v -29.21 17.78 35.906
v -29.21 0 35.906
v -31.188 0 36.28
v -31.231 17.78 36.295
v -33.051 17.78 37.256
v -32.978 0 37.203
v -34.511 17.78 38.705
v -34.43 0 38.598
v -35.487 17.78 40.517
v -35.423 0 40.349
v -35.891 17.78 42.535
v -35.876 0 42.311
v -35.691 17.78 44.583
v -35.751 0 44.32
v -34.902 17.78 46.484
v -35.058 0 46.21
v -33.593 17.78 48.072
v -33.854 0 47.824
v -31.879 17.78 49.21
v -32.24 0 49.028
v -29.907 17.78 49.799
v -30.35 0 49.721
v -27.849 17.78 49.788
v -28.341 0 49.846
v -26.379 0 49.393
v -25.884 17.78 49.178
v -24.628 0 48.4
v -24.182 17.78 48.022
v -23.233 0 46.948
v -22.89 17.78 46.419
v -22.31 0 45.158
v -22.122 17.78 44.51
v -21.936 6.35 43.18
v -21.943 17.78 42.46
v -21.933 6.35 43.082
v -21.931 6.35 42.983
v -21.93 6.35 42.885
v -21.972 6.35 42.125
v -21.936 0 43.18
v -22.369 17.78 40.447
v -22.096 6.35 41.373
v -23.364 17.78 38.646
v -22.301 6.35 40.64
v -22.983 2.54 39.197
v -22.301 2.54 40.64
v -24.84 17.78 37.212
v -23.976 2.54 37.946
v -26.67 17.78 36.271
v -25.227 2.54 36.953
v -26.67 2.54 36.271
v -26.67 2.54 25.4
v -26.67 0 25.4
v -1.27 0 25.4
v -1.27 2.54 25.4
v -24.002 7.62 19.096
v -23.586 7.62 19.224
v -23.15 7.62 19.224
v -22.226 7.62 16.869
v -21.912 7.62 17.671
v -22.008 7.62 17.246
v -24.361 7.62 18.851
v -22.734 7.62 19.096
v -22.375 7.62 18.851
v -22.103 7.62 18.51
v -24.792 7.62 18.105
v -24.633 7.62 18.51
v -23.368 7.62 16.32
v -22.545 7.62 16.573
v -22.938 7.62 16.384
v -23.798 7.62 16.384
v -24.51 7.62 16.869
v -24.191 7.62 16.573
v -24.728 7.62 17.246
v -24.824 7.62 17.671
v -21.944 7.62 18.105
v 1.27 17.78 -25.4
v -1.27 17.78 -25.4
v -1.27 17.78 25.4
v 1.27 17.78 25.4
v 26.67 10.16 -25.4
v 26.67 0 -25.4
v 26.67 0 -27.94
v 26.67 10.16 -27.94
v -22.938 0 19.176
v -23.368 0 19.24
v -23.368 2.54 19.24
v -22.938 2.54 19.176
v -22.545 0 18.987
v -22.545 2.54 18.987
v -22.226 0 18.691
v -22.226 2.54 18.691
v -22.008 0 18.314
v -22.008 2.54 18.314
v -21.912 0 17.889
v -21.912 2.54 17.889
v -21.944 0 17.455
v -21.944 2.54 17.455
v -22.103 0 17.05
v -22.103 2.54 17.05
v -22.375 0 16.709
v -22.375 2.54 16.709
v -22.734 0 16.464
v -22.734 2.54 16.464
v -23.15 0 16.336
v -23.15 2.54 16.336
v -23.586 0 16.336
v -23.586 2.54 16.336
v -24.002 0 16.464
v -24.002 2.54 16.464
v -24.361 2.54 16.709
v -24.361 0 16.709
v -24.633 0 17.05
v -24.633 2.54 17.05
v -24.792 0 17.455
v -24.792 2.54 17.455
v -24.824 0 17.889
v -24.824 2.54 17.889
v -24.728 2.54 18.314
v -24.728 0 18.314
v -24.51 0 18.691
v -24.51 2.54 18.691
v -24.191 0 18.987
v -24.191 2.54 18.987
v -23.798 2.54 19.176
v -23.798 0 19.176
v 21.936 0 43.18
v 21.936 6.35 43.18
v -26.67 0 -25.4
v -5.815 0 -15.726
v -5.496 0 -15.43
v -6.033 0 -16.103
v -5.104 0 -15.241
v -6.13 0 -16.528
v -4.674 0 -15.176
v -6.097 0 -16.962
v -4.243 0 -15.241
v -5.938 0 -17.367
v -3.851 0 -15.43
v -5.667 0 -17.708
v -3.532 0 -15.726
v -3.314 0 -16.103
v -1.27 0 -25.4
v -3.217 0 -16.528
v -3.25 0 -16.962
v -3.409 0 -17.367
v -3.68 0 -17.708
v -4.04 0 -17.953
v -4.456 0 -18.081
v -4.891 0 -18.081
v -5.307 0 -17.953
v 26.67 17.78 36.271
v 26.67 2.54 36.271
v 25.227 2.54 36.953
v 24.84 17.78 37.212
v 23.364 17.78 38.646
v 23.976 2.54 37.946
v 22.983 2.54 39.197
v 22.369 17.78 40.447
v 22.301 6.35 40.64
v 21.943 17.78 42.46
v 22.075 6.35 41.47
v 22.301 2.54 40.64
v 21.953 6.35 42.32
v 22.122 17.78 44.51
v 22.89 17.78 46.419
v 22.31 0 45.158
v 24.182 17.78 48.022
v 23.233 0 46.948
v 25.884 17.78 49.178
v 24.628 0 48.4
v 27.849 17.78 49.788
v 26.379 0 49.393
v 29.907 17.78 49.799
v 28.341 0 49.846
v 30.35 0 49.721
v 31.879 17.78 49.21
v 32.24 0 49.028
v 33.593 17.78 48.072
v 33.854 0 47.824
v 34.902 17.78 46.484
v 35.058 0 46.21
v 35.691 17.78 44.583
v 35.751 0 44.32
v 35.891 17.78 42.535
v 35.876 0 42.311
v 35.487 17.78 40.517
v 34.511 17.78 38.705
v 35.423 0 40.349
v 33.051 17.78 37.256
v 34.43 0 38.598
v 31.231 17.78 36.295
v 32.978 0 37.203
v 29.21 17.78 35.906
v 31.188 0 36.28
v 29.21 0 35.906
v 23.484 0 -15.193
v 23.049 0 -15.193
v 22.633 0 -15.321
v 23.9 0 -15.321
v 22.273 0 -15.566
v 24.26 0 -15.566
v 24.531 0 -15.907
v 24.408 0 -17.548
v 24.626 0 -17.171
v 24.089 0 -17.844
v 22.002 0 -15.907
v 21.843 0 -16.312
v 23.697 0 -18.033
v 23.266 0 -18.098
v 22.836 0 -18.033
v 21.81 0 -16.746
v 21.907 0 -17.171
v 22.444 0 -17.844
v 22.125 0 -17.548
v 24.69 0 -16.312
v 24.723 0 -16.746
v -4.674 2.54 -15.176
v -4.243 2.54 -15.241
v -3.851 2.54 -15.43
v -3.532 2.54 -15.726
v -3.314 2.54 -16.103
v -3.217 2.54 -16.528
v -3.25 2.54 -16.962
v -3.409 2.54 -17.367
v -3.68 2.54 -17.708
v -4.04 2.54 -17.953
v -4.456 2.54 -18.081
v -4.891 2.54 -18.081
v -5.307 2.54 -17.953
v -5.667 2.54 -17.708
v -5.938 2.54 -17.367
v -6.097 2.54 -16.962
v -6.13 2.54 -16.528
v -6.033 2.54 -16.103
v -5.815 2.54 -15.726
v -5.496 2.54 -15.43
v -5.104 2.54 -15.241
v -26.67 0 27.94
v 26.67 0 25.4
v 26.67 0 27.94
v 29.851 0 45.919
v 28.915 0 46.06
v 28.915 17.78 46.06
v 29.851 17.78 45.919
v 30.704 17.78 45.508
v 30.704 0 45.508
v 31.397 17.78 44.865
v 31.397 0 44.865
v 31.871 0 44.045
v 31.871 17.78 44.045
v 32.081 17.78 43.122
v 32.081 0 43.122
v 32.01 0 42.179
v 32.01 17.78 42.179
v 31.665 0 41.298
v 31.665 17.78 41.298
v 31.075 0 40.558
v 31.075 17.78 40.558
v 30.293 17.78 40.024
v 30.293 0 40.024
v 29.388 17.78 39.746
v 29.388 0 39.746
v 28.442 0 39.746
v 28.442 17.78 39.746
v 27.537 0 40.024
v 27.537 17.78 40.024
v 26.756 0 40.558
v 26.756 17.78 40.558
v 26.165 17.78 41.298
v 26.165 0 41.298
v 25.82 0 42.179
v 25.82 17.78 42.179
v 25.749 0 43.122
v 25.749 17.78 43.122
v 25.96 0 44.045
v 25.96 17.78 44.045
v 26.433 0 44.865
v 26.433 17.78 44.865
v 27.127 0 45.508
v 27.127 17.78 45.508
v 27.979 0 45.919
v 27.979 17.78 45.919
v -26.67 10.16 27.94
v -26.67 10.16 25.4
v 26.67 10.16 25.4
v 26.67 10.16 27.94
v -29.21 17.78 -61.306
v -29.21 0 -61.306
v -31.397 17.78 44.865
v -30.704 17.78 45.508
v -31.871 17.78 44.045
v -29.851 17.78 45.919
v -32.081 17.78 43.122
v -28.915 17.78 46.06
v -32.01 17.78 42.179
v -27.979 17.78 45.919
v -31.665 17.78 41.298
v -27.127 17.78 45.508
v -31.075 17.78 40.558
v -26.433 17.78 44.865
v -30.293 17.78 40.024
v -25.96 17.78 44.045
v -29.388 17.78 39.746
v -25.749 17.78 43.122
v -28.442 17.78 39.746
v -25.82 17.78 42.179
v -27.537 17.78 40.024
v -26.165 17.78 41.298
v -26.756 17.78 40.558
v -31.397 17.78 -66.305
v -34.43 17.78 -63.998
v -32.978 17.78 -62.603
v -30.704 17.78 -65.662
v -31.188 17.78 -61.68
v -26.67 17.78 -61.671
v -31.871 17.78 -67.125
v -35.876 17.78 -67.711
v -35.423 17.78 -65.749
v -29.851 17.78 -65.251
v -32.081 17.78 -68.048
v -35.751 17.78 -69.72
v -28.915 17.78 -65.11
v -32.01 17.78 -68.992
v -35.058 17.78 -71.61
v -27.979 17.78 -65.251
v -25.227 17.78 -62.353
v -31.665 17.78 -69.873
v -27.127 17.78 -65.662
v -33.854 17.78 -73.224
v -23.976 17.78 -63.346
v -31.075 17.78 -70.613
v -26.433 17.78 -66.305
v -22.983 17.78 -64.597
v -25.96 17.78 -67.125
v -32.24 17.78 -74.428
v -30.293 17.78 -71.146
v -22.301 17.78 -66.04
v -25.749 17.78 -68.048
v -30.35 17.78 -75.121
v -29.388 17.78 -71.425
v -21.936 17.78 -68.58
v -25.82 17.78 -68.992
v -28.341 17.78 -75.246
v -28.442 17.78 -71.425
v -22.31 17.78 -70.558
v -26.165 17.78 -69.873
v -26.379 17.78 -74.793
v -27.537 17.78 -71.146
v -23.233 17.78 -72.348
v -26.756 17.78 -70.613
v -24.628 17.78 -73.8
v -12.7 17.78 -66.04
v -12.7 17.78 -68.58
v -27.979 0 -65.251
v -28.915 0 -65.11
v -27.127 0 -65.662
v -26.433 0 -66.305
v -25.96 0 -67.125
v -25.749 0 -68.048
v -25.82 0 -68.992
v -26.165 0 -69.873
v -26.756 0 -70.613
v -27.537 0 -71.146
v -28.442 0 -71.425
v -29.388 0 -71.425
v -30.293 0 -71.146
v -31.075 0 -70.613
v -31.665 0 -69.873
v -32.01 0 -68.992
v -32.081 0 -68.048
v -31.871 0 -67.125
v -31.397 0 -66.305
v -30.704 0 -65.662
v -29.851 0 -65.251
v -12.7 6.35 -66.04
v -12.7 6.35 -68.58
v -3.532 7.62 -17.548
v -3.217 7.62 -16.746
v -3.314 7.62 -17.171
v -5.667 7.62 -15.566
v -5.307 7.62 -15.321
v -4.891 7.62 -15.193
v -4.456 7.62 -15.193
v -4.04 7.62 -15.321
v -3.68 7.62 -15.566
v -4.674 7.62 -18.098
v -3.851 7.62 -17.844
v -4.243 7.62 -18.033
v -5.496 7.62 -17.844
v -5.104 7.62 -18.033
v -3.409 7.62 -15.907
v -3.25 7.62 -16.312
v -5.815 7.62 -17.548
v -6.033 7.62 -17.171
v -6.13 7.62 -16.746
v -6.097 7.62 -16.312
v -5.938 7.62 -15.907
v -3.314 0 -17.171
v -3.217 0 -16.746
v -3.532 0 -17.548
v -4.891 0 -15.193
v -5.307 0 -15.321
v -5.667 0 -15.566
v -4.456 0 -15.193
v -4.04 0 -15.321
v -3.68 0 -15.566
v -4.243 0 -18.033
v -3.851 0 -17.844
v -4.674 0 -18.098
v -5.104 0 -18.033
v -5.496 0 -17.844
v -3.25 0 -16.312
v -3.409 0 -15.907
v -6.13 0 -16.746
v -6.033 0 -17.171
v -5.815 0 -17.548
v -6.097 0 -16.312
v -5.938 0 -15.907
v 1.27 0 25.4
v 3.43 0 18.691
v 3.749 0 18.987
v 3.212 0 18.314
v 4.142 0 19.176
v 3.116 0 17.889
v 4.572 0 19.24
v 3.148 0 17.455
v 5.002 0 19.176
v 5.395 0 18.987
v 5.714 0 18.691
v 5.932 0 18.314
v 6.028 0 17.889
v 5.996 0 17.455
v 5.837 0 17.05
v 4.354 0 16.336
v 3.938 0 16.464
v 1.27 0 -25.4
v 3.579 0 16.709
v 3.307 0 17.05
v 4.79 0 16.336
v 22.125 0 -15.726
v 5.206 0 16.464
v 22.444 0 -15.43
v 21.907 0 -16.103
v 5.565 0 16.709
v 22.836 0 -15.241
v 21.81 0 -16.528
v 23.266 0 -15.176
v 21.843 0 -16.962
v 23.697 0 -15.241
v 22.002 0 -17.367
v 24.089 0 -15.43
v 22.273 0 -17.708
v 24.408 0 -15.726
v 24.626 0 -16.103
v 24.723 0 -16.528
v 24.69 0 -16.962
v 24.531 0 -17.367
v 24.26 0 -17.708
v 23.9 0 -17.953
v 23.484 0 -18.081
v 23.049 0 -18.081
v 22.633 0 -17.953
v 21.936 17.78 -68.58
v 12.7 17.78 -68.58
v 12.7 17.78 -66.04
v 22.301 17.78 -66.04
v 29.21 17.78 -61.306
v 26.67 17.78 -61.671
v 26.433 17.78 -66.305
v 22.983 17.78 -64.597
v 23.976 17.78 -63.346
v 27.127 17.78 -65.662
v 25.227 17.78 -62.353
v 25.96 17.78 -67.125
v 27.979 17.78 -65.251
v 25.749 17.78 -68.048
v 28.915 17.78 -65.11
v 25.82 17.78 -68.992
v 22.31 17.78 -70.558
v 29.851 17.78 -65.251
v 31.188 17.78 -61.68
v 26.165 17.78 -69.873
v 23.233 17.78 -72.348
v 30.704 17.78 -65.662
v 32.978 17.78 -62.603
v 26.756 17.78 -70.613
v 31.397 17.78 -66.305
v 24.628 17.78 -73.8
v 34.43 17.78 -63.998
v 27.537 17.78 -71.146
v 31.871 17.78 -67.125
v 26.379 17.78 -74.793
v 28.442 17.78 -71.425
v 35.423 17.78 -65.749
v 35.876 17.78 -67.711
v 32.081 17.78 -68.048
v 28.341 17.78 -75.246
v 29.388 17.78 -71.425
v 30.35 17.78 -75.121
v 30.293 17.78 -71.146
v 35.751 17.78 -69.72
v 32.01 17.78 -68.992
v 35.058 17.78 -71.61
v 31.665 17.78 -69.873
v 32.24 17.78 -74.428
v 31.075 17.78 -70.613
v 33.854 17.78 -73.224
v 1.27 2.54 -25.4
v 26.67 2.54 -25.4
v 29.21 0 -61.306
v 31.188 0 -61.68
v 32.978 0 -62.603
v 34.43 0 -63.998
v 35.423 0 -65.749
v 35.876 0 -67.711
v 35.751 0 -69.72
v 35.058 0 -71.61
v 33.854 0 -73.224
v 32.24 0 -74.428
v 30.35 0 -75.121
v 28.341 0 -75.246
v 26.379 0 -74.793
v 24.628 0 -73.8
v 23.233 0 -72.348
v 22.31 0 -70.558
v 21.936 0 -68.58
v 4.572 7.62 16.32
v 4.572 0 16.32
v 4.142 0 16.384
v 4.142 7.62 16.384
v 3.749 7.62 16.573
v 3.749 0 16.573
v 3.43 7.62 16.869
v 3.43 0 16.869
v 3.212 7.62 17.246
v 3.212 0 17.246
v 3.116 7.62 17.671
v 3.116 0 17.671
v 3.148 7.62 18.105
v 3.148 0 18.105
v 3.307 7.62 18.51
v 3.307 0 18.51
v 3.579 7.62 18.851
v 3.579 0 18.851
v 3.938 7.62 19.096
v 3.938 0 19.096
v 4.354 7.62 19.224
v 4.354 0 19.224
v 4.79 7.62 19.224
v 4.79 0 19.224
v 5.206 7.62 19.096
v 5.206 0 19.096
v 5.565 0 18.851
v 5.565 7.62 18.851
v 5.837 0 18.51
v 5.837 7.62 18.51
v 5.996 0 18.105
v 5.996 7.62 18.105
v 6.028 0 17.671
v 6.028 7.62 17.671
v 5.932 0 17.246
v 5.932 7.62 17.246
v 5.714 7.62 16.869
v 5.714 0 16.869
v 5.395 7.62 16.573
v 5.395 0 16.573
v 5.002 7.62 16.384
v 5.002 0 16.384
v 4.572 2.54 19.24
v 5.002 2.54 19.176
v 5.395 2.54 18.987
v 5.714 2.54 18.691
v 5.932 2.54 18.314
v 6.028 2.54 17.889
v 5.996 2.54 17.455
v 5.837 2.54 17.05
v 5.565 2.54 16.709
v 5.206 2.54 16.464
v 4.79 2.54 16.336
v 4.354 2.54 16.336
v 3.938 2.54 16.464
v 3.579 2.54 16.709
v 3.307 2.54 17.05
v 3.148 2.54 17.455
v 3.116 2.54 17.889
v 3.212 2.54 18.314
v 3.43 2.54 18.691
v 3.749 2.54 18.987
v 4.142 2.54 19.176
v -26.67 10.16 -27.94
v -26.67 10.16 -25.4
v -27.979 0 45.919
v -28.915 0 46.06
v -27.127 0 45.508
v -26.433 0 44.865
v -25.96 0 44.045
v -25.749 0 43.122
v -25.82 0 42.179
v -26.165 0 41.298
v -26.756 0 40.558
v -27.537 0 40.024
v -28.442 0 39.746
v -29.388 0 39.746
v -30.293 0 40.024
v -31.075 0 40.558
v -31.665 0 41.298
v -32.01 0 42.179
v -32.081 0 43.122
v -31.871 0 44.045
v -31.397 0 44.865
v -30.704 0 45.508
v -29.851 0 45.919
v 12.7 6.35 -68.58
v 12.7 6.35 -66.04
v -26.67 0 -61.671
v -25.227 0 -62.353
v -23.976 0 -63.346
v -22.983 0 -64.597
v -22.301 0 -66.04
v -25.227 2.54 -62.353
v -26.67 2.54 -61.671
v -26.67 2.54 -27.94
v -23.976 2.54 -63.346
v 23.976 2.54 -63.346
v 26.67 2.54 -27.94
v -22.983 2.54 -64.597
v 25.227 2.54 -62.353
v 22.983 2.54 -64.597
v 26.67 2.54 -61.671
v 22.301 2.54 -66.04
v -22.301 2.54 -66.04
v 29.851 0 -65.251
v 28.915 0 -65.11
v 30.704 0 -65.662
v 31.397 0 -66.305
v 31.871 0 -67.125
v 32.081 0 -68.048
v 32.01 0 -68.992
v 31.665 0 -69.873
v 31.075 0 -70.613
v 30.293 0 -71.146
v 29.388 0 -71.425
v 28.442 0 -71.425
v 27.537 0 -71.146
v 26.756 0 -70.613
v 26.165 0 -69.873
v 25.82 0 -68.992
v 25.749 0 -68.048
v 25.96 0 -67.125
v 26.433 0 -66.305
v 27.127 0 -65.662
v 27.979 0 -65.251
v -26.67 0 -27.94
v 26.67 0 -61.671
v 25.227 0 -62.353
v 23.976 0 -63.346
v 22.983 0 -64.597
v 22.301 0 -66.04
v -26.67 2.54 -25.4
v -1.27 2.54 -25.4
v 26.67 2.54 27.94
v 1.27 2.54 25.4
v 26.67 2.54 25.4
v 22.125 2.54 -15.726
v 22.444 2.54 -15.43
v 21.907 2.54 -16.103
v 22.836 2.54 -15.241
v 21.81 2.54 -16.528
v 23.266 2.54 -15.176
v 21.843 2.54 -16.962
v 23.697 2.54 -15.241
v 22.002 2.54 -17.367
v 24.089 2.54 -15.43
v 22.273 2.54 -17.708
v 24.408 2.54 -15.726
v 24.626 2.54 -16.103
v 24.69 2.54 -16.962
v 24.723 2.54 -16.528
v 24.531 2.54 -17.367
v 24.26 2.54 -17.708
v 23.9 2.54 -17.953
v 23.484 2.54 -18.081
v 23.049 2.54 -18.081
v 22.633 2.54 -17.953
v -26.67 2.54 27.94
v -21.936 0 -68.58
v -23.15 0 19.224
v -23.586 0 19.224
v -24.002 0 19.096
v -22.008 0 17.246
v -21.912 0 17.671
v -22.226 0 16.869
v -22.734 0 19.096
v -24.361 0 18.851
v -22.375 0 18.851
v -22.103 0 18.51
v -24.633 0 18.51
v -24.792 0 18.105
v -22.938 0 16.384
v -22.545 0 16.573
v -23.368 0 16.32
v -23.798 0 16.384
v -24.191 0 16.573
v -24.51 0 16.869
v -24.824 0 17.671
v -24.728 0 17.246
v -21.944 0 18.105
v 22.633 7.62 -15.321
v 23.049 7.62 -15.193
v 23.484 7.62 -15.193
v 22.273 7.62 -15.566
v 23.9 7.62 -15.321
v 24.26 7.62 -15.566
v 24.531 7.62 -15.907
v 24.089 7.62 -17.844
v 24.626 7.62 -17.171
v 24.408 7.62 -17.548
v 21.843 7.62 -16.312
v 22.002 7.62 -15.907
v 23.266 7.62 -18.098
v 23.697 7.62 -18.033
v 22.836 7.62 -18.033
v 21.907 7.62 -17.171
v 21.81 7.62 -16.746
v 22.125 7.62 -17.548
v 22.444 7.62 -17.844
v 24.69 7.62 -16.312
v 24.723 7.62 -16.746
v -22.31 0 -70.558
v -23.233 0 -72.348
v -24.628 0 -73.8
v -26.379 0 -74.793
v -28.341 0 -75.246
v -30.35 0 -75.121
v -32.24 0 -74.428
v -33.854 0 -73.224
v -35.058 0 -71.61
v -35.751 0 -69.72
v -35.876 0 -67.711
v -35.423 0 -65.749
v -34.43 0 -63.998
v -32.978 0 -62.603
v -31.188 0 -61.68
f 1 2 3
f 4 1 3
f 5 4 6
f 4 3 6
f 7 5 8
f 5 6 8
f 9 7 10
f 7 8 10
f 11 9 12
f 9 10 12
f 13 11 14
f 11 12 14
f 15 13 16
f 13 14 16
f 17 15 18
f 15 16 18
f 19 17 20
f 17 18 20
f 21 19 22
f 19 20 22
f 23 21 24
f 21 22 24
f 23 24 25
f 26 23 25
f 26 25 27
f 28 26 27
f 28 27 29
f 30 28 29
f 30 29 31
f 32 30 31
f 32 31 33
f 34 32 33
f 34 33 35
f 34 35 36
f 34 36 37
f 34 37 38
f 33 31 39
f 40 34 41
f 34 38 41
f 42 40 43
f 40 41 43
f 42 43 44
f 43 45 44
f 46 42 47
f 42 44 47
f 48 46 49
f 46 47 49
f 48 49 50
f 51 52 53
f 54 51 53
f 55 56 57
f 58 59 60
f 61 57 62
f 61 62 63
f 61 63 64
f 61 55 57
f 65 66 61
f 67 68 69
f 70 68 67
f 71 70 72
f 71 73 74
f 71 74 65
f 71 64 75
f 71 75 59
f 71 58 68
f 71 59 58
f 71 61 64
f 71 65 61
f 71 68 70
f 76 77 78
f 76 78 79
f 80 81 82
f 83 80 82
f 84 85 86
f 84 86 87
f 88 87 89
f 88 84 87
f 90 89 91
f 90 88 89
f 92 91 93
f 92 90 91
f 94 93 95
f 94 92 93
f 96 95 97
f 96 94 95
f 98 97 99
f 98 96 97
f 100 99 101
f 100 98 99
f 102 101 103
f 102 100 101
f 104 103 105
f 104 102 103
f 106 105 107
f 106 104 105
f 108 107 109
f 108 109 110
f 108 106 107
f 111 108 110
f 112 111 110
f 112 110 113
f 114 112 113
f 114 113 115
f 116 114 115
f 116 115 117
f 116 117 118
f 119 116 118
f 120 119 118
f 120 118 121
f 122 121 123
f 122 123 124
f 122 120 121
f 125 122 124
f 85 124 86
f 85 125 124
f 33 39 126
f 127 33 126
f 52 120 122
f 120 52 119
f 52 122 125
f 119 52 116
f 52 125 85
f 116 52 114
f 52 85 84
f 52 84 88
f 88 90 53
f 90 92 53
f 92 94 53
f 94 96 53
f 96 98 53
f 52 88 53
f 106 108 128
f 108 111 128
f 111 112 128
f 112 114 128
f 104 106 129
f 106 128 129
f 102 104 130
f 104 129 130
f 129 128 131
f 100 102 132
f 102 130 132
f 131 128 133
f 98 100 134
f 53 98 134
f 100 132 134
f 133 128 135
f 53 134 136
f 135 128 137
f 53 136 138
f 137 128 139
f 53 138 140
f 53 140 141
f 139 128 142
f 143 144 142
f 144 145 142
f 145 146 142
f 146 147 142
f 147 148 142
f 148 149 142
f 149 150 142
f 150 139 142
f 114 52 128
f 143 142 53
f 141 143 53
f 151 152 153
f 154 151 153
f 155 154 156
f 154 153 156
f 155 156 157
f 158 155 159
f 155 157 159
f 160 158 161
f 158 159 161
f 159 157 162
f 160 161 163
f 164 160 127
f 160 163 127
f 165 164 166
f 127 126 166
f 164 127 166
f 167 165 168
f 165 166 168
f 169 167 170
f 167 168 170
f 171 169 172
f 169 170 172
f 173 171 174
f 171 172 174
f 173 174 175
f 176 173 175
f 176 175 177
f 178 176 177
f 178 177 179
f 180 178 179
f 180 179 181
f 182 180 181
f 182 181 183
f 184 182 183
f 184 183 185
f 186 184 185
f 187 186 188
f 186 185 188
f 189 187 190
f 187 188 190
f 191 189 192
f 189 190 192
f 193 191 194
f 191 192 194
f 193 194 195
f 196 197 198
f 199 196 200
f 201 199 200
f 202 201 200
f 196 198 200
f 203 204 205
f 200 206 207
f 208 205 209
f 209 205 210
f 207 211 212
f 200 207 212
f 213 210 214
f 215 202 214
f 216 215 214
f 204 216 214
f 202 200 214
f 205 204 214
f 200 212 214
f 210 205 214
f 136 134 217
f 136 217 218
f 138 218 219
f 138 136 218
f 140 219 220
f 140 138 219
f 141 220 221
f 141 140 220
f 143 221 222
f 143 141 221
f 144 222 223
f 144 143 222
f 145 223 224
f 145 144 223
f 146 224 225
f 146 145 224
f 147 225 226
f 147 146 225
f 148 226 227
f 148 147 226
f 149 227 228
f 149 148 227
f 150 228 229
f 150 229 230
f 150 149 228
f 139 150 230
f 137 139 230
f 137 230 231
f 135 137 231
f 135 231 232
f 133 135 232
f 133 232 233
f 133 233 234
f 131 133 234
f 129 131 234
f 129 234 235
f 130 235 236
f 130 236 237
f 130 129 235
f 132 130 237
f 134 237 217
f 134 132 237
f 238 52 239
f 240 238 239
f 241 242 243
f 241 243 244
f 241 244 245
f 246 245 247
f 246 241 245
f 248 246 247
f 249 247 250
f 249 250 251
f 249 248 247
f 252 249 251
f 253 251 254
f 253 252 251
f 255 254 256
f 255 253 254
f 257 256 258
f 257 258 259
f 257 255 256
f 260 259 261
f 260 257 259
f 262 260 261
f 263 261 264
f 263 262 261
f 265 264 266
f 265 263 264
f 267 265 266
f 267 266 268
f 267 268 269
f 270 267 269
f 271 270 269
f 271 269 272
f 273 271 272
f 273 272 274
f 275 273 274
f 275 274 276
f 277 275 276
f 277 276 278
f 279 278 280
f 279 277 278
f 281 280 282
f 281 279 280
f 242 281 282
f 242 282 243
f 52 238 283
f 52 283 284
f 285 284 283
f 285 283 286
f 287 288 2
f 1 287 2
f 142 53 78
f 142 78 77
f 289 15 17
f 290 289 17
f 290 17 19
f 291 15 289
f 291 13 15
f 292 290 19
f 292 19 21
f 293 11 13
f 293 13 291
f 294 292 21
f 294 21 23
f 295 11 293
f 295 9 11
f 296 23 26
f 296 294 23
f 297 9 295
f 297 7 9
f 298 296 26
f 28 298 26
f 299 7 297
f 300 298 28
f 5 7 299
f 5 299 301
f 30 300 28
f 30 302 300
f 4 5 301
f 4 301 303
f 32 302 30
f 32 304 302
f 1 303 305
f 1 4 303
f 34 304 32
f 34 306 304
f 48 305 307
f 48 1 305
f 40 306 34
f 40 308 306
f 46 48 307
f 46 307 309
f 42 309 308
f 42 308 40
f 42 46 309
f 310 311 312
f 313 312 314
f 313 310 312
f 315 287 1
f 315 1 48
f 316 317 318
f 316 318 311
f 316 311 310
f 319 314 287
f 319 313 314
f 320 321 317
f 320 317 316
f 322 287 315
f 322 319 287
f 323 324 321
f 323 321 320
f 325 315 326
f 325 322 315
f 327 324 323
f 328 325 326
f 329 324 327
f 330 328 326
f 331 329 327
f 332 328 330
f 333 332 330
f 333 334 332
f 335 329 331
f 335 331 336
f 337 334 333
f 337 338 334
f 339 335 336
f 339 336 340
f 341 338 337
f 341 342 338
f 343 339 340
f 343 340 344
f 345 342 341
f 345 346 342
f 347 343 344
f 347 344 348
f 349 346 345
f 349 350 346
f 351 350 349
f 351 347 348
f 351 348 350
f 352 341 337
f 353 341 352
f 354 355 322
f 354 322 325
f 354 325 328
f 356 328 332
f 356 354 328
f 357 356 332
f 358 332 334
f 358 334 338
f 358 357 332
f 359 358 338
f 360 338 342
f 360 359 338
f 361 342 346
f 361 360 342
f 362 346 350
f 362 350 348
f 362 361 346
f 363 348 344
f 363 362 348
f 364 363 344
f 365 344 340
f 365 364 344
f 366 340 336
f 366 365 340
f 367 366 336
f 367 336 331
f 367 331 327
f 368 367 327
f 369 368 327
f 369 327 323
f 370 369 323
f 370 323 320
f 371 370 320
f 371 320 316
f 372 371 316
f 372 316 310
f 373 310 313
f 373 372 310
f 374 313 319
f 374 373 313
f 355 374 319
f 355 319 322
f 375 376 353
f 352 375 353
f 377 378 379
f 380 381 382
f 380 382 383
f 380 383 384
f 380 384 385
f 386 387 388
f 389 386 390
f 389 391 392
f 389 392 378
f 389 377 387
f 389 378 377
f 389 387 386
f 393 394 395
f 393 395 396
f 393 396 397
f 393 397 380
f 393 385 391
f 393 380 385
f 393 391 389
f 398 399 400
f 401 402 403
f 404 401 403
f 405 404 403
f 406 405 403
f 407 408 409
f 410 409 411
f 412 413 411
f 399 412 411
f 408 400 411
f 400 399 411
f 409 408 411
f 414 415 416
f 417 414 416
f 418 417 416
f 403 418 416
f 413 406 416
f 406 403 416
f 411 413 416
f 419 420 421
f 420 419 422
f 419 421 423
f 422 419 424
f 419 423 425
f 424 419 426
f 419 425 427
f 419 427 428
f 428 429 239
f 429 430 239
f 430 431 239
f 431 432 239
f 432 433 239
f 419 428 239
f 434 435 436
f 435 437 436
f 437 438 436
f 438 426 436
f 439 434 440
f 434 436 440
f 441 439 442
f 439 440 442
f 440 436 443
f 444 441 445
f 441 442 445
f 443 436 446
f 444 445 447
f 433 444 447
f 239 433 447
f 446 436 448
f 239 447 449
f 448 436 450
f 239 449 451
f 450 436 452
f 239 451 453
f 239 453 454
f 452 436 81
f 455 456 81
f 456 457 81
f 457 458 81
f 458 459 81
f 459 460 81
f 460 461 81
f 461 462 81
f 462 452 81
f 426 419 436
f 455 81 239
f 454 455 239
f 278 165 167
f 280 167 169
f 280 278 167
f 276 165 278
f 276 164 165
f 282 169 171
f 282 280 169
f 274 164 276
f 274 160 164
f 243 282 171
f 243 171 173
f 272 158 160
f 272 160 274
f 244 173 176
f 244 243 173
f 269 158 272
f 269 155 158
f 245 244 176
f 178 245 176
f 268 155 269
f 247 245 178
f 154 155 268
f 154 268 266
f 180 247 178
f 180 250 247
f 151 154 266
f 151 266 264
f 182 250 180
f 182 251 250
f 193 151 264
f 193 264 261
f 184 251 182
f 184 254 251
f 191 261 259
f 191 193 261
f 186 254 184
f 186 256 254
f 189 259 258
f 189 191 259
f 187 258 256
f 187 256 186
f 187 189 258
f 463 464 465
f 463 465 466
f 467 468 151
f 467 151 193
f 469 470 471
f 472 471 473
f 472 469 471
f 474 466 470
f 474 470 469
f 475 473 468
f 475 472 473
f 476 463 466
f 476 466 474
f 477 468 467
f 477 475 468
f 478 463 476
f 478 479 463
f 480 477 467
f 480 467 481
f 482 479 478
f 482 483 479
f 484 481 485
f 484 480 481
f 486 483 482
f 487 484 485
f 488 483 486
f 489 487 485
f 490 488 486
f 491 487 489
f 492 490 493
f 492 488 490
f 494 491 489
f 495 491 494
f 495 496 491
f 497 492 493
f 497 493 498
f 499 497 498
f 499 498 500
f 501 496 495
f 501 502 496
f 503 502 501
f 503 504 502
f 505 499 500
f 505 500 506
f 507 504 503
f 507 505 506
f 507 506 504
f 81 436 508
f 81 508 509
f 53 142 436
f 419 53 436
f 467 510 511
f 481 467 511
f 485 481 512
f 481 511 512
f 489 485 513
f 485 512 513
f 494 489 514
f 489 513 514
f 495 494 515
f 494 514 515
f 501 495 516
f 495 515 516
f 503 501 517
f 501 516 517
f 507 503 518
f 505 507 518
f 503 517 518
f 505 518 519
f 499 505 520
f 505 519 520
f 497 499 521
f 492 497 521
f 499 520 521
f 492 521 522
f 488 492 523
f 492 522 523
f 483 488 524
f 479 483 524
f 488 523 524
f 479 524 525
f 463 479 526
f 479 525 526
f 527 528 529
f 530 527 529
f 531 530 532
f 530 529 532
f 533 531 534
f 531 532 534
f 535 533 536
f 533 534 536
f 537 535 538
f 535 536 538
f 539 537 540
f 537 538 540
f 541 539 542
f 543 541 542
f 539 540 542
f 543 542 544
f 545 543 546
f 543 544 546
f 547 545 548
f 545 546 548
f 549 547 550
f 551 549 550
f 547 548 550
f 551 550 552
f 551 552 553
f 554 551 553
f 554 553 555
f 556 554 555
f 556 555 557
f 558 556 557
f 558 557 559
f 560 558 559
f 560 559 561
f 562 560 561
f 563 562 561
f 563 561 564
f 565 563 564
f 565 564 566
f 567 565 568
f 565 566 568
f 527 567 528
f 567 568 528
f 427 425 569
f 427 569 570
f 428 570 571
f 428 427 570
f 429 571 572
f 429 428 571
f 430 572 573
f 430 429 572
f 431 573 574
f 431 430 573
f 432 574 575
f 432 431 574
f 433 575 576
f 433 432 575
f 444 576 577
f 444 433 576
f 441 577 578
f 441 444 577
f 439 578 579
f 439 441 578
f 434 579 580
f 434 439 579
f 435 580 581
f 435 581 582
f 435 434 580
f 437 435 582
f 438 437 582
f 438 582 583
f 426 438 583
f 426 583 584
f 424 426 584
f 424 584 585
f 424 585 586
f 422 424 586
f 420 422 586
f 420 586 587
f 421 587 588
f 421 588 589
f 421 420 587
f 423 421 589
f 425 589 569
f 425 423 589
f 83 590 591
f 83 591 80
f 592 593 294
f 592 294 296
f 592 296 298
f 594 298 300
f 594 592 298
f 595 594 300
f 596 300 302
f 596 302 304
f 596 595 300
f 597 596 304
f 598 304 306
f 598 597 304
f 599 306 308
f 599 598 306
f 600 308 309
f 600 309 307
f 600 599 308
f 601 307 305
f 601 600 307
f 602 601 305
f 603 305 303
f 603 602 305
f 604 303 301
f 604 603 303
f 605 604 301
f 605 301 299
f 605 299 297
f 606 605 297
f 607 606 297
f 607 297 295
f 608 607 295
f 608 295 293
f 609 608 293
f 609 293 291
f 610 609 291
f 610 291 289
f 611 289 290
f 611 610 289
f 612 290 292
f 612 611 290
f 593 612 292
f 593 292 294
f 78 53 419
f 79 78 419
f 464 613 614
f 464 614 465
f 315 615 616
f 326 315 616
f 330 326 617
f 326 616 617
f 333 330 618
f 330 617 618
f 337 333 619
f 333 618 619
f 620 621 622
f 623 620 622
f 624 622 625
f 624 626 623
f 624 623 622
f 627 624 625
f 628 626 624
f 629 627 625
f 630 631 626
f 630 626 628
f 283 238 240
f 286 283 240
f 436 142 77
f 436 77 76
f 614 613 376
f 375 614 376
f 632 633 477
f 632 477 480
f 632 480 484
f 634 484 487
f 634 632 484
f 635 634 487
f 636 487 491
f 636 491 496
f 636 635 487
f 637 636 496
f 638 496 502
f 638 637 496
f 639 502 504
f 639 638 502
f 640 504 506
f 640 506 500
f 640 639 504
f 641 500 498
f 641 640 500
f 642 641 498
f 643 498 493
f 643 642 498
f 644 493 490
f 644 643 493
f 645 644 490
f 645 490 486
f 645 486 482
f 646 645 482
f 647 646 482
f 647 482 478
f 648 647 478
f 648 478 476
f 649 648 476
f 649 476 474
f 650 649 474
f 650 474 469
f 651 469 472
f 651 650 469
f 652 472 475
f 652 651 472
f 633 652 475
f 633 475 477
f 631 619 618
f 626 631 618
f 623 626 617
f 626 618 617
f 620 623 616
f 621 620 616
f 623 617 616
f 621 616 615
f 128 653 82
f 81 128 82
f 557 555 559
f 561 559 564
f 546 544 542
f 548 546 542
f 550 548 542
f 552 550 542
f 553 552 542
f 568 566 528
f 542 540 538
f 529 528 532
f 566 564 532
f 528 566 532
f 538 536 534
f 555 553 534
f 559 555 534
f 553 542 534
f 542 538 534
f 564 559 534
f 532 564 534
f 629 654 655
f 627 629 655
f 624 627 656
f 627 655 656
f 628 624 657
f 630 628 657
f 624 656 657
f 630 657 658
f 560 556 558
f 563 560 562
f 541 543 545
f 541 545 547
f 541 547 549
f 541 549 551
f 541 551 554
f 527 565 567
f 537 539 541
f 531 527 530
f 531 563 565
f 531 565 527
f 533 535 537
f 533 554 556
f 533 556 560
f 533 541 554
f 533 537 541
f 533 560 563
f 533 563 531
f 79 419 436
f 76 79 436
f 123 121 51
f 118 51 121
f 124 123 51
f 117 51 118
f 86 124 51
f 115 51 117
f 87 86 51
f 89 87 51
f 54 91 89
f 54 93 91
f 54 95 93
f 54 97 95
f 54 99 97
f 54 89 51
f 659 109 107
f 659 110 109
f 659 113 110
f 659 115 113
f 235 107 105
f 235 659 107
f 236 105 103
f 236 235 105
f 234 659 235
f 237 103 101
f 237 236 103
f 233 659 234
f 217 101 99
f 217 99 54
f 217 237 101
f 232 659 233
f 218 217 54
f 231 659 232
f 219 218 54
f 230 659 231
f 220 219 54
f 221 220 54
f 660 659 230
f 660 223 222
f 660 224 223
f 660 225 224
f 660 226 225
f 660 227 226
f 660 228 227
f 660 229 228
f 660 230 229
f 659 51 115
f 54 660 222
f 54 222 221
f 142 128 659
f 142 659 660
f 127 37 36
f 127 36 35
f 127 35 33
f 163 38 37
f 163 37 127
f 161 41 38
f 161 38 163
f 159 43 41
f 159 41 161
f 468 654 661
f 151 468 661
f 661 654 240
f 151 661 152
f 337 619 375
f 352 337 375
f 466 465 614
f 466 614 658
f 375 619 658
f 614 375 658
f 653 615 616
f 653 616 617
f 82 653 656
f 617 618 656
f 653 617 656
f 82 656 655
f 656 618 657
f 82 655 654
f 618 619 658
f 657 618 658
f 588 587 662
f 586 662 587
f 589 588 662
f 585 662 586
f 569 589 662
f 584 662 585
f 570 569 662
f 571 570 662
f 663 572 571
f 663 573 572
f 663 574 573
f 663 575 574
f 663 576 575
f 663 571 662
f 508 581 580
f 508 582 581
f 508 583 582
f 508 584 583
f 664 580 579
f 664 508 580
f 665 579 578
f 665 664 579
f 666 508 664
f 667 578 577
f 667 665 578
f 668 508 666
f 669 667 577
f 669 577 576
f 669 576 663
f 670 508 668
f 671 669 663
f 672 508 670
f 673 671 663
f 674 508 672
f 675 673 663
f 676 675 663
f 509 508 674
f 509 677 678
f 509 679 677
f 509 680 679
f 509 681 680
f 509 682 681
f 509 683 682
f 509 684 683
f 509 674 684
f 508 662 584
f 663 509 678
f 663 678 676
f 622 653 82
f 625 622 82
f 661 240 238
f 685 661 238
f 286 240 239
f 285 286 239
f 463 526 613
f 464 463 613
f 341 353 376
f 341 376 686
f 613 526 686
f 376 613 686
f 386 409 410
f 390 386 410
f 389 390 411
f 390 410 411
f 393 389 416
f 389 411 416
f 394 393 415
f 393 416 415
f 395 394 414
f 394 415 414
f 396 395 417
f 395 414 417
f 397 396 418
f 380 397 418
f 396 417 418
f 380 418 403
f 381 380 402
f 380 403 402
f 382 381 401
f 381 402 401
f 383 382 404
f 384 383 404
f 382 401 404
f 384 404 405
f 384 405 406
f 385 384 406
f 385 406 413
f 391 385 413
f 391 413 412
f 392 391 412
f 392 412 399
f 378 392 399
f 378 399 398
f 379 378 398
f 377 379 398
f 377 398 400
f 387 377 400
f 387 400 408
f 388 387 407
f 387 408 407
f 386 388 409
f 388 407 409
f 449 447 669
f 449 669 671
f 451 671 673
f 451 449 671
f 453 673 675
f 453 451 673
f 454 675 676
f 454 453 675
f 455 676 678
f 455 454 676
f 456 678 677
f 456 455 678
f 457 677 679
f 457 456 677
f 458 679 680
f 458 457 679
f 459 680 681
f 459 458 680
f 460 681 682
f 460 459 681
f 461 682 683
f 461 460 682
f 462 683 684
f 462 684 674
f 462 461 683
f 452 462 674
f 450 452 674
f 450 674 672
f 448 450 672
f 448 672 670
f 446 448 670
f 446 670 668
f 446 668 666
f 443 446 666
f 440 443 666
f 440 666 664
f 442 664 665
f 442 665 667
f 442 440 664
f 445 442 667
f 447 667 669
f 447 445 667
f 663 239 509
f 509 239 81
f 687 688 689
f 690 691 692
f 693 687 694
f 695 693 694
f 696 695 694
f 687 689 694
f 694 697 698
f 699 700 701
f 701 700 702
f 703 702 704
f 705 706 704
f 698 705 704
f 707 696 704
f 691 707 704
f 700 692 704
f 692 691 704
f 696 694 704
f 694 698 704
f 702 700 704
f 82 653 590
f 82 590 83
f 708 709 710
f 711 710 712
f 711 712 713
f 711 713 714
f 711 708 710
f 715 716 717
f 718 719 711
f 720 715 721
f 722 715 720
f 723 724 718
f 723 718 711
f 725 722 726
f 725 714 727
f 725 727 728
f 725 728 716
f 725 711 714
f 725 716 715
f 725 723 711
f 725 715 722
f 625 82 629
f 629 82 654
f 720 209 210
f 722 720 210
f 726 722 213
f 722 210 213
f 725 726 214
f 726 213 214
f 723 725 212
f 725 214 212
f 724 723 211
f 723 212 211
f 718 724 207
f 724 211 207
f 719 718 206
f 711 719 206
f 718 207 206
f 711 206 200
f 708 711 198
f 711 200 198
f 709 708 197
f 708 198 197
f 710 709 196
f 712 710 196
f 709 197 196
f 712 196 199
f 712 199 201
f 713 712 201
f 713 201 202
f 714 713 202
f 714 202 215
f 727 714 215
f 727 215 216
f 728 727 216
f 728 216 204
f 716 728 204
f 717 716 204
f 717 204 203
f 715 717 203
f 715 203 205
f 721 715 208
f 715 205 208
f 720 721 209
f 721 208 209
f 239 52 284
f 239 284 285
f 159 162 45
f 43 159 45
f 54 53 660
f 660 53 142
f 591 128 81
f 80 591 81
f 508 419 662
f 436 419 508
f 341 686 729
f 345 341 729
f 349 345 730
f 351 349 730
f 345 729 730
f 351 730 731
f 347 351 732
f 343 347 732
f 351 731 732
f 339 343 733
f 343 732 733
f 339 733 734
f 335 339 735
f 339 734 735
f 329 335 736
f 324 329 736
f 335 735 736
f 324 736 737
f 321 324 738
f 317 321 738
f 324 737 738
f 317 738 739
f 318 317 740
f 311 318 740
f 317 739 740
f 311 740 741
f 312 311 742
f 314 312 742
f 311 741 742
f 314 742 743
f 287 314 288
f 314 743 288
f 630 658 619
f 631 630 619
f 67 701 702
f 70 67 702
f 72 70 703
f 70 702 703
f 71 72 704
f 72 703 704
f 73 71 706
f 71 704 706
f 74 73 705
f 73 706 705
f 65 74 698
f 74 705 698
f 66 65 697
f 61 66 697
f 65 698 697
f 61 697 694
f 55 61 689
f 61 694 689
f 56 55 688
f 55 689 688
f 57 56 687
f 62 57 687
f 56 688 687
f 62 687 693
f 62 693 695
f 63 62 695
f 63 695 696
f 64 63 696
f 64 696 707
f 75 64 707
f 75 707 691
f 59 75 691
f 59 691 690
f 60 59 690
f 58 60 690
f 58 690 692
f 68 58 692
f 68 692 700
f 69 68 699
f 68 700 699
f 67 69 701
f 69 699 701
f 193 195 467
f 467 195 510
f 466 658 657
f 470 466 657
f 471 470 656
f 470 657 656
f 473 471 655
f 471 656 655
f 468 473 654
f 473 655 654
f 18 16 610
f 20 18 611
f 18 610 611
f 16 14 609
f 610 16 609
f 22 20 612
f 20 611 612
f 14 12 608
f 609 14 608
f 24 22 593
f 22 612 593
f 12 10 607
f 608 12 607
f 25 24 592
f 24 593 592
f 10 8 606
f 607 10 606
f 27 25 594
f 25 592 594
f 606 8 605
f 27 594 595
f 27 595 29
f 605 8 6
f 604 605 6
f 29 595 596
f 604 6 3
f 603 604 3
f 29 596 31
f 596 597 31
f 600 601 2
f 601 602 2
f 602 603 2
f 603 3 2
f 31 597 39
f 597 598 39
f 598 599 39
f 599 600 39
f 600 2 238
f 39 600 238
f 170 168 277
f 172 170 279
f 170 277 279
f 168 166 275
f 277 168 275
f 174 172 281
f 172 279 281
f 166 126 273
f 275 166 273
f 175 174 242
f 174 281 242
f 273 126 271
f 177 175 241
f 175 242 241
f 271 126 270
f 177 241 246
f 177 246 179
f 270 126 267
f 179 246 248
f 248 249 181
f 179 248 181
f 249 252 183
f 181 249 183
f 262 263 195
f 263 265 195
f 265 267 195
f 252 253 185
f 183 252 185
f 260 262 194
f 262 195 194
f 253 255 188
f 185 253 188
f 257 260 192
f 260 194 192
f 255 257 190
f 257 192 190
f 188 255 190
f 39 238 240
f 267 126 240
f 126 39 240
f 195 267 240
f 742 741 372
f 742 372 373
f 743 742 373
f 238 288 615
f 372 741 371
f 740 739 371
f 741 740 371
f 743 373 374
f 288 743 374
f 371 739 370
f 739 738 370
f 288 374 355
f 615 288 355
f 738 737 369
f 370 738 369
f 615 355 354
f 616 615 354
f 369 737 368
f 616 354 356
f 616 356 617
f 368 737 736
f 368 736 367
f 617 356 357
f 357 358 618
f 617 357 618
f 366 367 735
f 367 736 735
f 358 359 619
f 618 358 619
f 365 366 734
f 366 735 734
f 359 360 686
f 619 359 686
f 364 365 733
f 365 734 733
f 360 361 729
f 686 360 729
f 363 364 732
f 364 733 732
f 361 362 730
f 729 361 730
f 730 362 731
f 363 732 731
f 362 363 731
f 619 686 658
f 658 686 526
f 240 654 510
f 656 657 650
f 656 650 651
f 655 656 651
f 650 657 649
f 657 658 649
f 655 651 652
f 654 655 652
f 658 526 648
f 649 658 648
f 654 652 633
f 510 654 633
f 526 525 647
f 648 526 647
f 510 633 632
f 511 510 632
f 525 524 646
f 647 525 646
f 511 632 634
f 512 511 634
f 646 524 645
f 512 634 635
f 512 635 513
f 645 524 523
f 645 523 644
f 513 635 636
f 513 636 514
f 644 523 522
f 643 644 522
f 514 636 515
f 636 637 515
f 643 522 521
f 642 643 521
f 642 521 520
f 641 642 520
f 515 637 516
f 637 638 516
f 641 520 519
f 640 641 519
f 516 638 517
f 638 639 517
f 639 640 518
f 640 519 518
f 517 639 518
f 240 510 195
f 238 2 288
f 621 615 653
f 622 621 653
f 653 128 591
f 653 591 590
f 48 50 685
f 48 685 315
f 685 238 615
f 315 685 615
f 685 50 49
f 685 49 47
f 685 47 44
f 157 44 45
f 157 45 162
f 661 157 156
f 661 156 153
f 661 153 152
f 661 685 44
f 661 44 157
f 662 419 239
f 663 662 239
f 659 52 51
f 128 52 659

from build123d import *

# Parameters (mm, degrees)
SKETCH1_R              = 6.985
SKETCH1_R_2            = 3.175
SKETCH1_W              = 2.54
SKETCH1_H              = 50.8
BOSS_EXTRUDE1_DEPTH    = 17.78
SKETCH25_W             = 25.4
SKETCH25_H             = 50.8
SKETCH25_R             = 1.4605
BOSS_EXTRUDE10_DEPTH   = 2.54
BOSS_EXTRUDE10_2_DEPTH = 2.54
BOSS_EXTRUDE10_3_DEPTH = 2.54
BOSS_EXTRUDE10_4_DEPTH = 2.54
SKETCH16_R             = 1.4605
BOSS_EXTRUDE8_DEPTH    = 7.62
BOSS_EXTRUDE8_2_DEPTH  = 7.62
BOSS_EXTRUDE8_3_DEPTH  = 7.62
BOSS_EXTRUDE8_4_DEPTH  = 7.62
SKETCH17_W             = 53.34
SKETCH17_H             = 2.54
BOSS_EXTRUDE9_DEPTH    = 10.16
BOSS_EXTRUDE9_2_DEPTH  = 10.16
BOSS_EXTRUDE11_DEPTH   = 6.35
SKETCH20_W             = 25.4
SKETCH20_H             = 11.43
CUT_EXTRUDE7_DEPTH     = 2.54


with BuildPart() as part:
    # Sketch1 → Boss-Extrude1 (new body)
    # profile 1 of 12: a face of its own
    with BuildSketch(Plane(origin=(0, 0, 0), x_dir=(1, 0, 0), z_dir=(0, 1, 0))):
        with Locations((-28.91506403, -42.88506403)):
            Circle(SKETCH1_R)
        with Locations(Location((-28.91506403, -42.88506403, 0), (0, 0, 270))):
            Circle(SKETCH1_R_2, mode=Mode.SUBTRACT)
    # profile 2 of 12: a face of its own
    with BuildSketch(Plane(origin=(0, 0, 0), x_dir=(1, 0, 0), z_dir=(0, 1, 0))):
        with BuildLine():
            Line((-26.67, -36.270692367), (-26.67, -27.94))
            Line((-26.67, -27.94), (-29.21, -27.94))
            Line((-29.21, -27.94), (-29.21, -35.906293524))
            ThreePointArc((-29.21, -35.906293524), (-27.92312326, -35.970855579), (-26.67, -36.270692367))
        make_face()
    # profile 3 of 12: a face of its own
    with BuildSketch(Plane(origin=(0, 0, 0), x_dir=(1, 0, 0), z_dir=(0, 1, 0))):
        Polygon((-26.67, -27.94), (-26.67, -25.4), (-26.67, 25.4), (-26.67, 27.94), (-29.21, 27.94), (-29.21, -27.94), align=None)
    # profile 4 of 12: a face of its own
    with BuildSketch(Plane(origin=(0, 0, 0), x_dir=(1, 0, 0), z_dir=(0, 1, 0))):
        Polygon((26.67, -25.4), (26.67, -27.94), (29.21, -27.94), (29.21, 27.94), (26.67, 27.94), (26.67, 25.4), align=None)
    # profile 5 of 12: a face of its own
    with BuildSketch(Plane(origin=(0, 0, 0), x_dir=(1, 0, 0), z_dir=(0, 1, 0))):
        with BuildLine():
            Line((29.21, -27.94), (26.67, -27.94))
            Line((26.67, -27.94), (26.67, -36.270692367))
            ThreePointArc((26.67, -36.270692367), (27.92312326, -35.970855579), (29.21, -35.906293524))
            Line((29.21, -35.906293524), (29.21, -27.94))
        make_face()
    # profile 6 of 12: a face of its own
    with BuildSketch(Plane(origin=(0, 0, 0), x_dir=(1, 0, 0), z_dir=(0, 1, 0))):
        with Locations((28.91506403, -42.88506403)):
            Circle(SKETCH1_R)
        with Locations(Location((28.91506403, -42.88506403, 0), (0, 0, 270))):
            Circle(SKETCH1_R_2, mode=Mode.SUBTRACT)
    # profile 7 of 12: a face of its own
    with BuildSketch(Plane(origin=(0, 0, 0), x_dir=(1, 0, 0), z_dir=(0, 1, 0))):
        with BuildLine():
            Line((-29.21, 27.94), (-26.67, 27.94))
            Line((-26.67, 27.94), (-26.67, 61.670692367))
            ThreePointArc((-26.67, 61.670692367), (-27.92312326, 61.370855579), (-29.21, 61.306293524))
            Line((-29.21, 61.306293524), (-29.21, 27.94))
        make_face()
    # profile 8 of 12: a face of its own
    with BuildSketch(Plane(origin=(0, 0, 0), x_dir=(1, 0, 0), z_dir=(0, 1, 0))):
        with BuildLine():
            Line((26.67, 61.670692367), (26.67, 27.94))
            Line((26.67, 27.94), (29.21, 27.94))
            Line((29.21, 27.94), (29.21, 61.306293524))
            ThreePointArc((29.21, 61.306293524), (27.92312326, 61.370855579), (26.67, 61.670692367))
        make_face()
    # profile 9 of 12: a face of its own
    with BuildSketch(Plane(origin=(0, 0, 0), x_dir=(1, 0, 0), z_dir=(0, 1, 0))):
        with Locations((-28.91506403, 68.28506403)):
            Circle(SKETCH1_R)
        with Locations(Location((-28.91506403, 68.28506403, 0), (0, 0, 270))):
            Circle(SKETCH1_R_2, mode=Mode.SUBTRACT)
    # profile 10 of 12: a face of its own
    with BuildSketch(Plane(origin=(0, 0, 0), x_dir=(1, 0, 0), z_dir=(0, 1, 0))):
        with BuildLine():
            ThreePointArc((-21.93006403, 68.28506403), (-22.023343959, 67.147338463), (-22.300692367, 66.04))
            Line((-22.300692367, 66.04), (22.300692367, 66.04))
            ThreePointArc((22.300692367, 66.04), (22.000855579, 67.29312326), (21.936293524, 68.58))
            Line((21.936293524, 68.58), (-21.936293524, 68.58))
            ThreePointArc((-21.936293524, 68.58), (-21.931621577, 68.432564906), (-21.93006403, 68.28506403))
        make_face()
    # profile 11 of 12: a face of its own
    with BuildSketch(Plane(origin=(0, 0, 0), x_dir=(1, 0, 0), z_dir=(0, 1, 0))):
        with Locations((28.91506403, 68.28506403)):
            Circle(SKETCH1_R)
        with Locations(Location((28.91506403, 68.28506403, 0), (0, 0, 270))):
            Circle(SKETCH1_R_2, mode=Mode.SUBTRACT)
    # profile 12 of 12: a face of its own
    with BuildSketch(Plane(origin=(0, 0, 0), x_dir=(1, 0, 0), z_dir=(0, 1, 0))):
        Rectangle(SKETCH1_W, SKETCH1_H)
    extrude(amount=BOSS_EXTRUDE1_DEPTH)



with BuildPart() as body_2:
    # Sketch25 → Boss-Extrude10 (new body)
    with BuildSketch(Plane(origin=(0, 0, 0), x_dir=(1, 0, 0), z_dir=(0, 1, 0))):
        with Locations((-13.97, 0)):
            Rectangle(SKETCH25_W, SKETCH25_H)
        with Locations(Location((-4.6736, 16.637, 0), (0, 0, 270))):
            Circle(SKETCH25_R, mode=Mode.SUBTRACT)
        with Locations(Location((-23.368, -17.78, 0), (0, 0, 270))):
            Circle(SKETCH25_R, mode=Mode.SUBTRACT)
    extrude(amount=BOSS_EXTRUDE10_DEPTH)


with BuildPart() as body_3:
    # Sketch25 → Boss-Extrude10 2 (new body)
    with BuildSketch(Plane(origin=(0, 0, 0), x_dir=(1, 0, 0), z_dir=(0, 1, 0))):
        with Locations((13.97, 0)):
            Rectangle(SKETCH25_W, SKETCH25_H)
        with Locations(Location((4.572, -17.78, 0), (0, 0, 270))):
            Circle(SKETCH25_R, mode=Mode.SUBTRACT)
        with Locations(Location((23.2664, 16.637, 0), (0, 0, 270))):
            Circle(SKETCH25_R, mode=Mode.SUBTRACT)
    extrude(amount=BOSS_EXTRUDE10_2_DEPTH)


with BuildPart() as body_4:
    # Sketch25 → Boss-Extrude10 3 (new body)
    with BuildSketch(Plane(origin=(0, 0, 0), x_dir=(1, 0, 0), z_dir=(0, 1, 0))):
        with BuildLine():
            Line((-26.67, 27.94), (26.67, 27.94))
            Line((26.67, 27.94), (26.67, 61.670692367))
            ThreePointArc((26.67, 61.670692367), (23.975923164, 63.345923164), (22.300692367, 66.04))
            Line((22.300692367, 66.04), (-22.300692367, 66.04))
            ThreePointArc((-22.300692367, 66.04), (-23.975923164, 63.345923164), (-26.67, 61.670692367))
            Line((-26.67, 61.670692367), (-26.67, 27.94))
        make_face()
    extrude(amount=BOSS_EXTRUDE10_3_DEPTH)


with BuildPart() as body_5:
    # Sketch25 → Boss-Extrude10 4 (new body)
    with BuildSketch(Plane(origin=(0, 0, 0), x_dir=(1, 0, 0), z_dir=(0, 1, 0))):
        with BuildLine():
            Line((26.67, -36.270692367), (26.67, -27.94))
            Line((26.67, -27.94), (-26.67, -27.94))
            Line((-26.67, -27.94), (-26.67, -36.270692367))
            ThreePointArc((-26.67, -36.270692367), (-23.975923164, -37.945923164), (-22.300692367, -40.64))
            Line((-22.300692367, -40.64), (22.300692367, -40.64))
            ThreePointArc((22.300692367, -40.64), (23.975923164, -37.945923164), (26.67, -36.270692367))
        make_face()
    extrude(amount=BOSS_EXTRUDE10_4_DEPTH)


with BuildPart() as body_6:
    # Sketch16 → Boss-Extrude8 (new body)
    with BuildSketch(Plane(origin=(0, 0, 0), x_dir=(1, 0, 0), z_dir=(0, 1, 0))):
        with Locations(Location((-4.6736, 16.637, 0), (0, 0, 90))):
            Circle(SKETCH16_R)
    extrude(amount=BOSS_EXTRUDE8_DEPTH)


with BuildPart() as body_7:
    # Sketch16 → Boss-Extrude8 2 (new body)
    with BuildSketch(Plane(origin=(0, 0, 0), x_dir=(1, 0, 0), z_dir=(0, 1, 0))):
        with Locations(Location((-23.368, -17.78, 0), (0, 0, 90))):
            Circle(SKETCH16_R)
    extrude(amount=BOSS_EXTRUDE8_2_DEPTH)


with BuildPart() as body_8:
    # Sketch16 → Boss-Extrude8 3 (new body)
    with BuildSketch(Plane(origin=(0, 0, 0), x_dir=(1, 0, 0), z_dir=(0, 1, 0))):
        with Locations(Location((4.572, -17.78, 0), (0, 0, 90))):
            Circle(SKETCH16_R)
    extrude(amount=BOSS_EXTRUDE8_3_DEPTH)


with BuildPart() as body_9:
    # Sketch16 → Boss-Extrude8 4 (new body)
    with BuildSketch(Plane(origin=(0, 0, 0), x_dir=(1, 0, 0), z_dir=(0, 1, 0))):
        with Locations(Location((23.2664, 16.637, 0), (0, 0, 90))):
            Circle(SKETCH16_R)
    extrude(amount=BOSS_EXTRUDE8_4_DEPTH)


with BuildPart() as body_10:
    # Sketch17 → Boss-Extrude9 (new body)
    with BuildSketch(Plane(origin=(0, 0, 0), x_dir=(1, 0, 0), z_dir=(0, 1, 0))):
        with Locations((0, -26.67)):
            Rectangle(SKETCH17_W, SKETCH17_H)
    extrude(amount=BOSS_EXTRUDE9_DEPTH)


with BuildPart() as body_11:
    # Sketch17 → Boss-Extrude9 2 (new body)
    with BuildSketch(Plane(origin=(0, 0, 0), x_dir=(1, 0, 0), z_dir=(0, 1, 0))):
        with Locations((0, 26.67)):
            Rectangle(SKETCH17_W, SKETCH17_H)
    extrude(amount=BOSS_EXTRUDE9_2_DEPTH)


with BuildPart() as part_1:
    add(part.part)

    add(body_5.part)  # Boss-Extrude11 merges body 5
    # Sketch27 → Boss-Extrude11 (add)
    with BuildSketch(Plane(origin=(0, 0, 0), x_dir=(1, 0, 0), z_dir=(0, 1, 0))):
        with BuildLine():
            Line((22.300692367, -40.64), (-22.300692367, -40.64))
            ThreePointArc((-22.300692367, -40.64), (-22.023343959, -41.747338463), (-21.93006403, -42.88506403))
            ThreePointArc((-21.93006403, -42.88506403), (-21.931621577, -43.032564906), (-21.936293524, -43.18))
            Line((-21.936293524, -43.18), (21.936293524, -43.18))
            ThreePointArc((21.936293524, -43.18), (22.000855579, -41.89312326), (22.300692367, -40.64))
        make_face()
    extrude(amount=BOSS_EXTRUDE11_DEPTH)

    # Sketch20 → Cut-Extrude7 (cut)
    with BuildSketch(Plane(origin=(0, 0, -68.58), x_dir=(-1, 0, 0), z_dir=(0, 0, -1))):
        with Locations((0, 12.065)):
            Rectangle(SKETCH20_W, SKETCH20_H)
    extrude(amount=-CUT_EXTRUDE7_DEPTH, mode=Mode.SUBTRACT)


solid = Compound([body_2.part, body_3.part, body_4.part, body_6.part, body_7.part, body_8.part, body_9.part, body_10.part, body_11.part, part_1.part])
